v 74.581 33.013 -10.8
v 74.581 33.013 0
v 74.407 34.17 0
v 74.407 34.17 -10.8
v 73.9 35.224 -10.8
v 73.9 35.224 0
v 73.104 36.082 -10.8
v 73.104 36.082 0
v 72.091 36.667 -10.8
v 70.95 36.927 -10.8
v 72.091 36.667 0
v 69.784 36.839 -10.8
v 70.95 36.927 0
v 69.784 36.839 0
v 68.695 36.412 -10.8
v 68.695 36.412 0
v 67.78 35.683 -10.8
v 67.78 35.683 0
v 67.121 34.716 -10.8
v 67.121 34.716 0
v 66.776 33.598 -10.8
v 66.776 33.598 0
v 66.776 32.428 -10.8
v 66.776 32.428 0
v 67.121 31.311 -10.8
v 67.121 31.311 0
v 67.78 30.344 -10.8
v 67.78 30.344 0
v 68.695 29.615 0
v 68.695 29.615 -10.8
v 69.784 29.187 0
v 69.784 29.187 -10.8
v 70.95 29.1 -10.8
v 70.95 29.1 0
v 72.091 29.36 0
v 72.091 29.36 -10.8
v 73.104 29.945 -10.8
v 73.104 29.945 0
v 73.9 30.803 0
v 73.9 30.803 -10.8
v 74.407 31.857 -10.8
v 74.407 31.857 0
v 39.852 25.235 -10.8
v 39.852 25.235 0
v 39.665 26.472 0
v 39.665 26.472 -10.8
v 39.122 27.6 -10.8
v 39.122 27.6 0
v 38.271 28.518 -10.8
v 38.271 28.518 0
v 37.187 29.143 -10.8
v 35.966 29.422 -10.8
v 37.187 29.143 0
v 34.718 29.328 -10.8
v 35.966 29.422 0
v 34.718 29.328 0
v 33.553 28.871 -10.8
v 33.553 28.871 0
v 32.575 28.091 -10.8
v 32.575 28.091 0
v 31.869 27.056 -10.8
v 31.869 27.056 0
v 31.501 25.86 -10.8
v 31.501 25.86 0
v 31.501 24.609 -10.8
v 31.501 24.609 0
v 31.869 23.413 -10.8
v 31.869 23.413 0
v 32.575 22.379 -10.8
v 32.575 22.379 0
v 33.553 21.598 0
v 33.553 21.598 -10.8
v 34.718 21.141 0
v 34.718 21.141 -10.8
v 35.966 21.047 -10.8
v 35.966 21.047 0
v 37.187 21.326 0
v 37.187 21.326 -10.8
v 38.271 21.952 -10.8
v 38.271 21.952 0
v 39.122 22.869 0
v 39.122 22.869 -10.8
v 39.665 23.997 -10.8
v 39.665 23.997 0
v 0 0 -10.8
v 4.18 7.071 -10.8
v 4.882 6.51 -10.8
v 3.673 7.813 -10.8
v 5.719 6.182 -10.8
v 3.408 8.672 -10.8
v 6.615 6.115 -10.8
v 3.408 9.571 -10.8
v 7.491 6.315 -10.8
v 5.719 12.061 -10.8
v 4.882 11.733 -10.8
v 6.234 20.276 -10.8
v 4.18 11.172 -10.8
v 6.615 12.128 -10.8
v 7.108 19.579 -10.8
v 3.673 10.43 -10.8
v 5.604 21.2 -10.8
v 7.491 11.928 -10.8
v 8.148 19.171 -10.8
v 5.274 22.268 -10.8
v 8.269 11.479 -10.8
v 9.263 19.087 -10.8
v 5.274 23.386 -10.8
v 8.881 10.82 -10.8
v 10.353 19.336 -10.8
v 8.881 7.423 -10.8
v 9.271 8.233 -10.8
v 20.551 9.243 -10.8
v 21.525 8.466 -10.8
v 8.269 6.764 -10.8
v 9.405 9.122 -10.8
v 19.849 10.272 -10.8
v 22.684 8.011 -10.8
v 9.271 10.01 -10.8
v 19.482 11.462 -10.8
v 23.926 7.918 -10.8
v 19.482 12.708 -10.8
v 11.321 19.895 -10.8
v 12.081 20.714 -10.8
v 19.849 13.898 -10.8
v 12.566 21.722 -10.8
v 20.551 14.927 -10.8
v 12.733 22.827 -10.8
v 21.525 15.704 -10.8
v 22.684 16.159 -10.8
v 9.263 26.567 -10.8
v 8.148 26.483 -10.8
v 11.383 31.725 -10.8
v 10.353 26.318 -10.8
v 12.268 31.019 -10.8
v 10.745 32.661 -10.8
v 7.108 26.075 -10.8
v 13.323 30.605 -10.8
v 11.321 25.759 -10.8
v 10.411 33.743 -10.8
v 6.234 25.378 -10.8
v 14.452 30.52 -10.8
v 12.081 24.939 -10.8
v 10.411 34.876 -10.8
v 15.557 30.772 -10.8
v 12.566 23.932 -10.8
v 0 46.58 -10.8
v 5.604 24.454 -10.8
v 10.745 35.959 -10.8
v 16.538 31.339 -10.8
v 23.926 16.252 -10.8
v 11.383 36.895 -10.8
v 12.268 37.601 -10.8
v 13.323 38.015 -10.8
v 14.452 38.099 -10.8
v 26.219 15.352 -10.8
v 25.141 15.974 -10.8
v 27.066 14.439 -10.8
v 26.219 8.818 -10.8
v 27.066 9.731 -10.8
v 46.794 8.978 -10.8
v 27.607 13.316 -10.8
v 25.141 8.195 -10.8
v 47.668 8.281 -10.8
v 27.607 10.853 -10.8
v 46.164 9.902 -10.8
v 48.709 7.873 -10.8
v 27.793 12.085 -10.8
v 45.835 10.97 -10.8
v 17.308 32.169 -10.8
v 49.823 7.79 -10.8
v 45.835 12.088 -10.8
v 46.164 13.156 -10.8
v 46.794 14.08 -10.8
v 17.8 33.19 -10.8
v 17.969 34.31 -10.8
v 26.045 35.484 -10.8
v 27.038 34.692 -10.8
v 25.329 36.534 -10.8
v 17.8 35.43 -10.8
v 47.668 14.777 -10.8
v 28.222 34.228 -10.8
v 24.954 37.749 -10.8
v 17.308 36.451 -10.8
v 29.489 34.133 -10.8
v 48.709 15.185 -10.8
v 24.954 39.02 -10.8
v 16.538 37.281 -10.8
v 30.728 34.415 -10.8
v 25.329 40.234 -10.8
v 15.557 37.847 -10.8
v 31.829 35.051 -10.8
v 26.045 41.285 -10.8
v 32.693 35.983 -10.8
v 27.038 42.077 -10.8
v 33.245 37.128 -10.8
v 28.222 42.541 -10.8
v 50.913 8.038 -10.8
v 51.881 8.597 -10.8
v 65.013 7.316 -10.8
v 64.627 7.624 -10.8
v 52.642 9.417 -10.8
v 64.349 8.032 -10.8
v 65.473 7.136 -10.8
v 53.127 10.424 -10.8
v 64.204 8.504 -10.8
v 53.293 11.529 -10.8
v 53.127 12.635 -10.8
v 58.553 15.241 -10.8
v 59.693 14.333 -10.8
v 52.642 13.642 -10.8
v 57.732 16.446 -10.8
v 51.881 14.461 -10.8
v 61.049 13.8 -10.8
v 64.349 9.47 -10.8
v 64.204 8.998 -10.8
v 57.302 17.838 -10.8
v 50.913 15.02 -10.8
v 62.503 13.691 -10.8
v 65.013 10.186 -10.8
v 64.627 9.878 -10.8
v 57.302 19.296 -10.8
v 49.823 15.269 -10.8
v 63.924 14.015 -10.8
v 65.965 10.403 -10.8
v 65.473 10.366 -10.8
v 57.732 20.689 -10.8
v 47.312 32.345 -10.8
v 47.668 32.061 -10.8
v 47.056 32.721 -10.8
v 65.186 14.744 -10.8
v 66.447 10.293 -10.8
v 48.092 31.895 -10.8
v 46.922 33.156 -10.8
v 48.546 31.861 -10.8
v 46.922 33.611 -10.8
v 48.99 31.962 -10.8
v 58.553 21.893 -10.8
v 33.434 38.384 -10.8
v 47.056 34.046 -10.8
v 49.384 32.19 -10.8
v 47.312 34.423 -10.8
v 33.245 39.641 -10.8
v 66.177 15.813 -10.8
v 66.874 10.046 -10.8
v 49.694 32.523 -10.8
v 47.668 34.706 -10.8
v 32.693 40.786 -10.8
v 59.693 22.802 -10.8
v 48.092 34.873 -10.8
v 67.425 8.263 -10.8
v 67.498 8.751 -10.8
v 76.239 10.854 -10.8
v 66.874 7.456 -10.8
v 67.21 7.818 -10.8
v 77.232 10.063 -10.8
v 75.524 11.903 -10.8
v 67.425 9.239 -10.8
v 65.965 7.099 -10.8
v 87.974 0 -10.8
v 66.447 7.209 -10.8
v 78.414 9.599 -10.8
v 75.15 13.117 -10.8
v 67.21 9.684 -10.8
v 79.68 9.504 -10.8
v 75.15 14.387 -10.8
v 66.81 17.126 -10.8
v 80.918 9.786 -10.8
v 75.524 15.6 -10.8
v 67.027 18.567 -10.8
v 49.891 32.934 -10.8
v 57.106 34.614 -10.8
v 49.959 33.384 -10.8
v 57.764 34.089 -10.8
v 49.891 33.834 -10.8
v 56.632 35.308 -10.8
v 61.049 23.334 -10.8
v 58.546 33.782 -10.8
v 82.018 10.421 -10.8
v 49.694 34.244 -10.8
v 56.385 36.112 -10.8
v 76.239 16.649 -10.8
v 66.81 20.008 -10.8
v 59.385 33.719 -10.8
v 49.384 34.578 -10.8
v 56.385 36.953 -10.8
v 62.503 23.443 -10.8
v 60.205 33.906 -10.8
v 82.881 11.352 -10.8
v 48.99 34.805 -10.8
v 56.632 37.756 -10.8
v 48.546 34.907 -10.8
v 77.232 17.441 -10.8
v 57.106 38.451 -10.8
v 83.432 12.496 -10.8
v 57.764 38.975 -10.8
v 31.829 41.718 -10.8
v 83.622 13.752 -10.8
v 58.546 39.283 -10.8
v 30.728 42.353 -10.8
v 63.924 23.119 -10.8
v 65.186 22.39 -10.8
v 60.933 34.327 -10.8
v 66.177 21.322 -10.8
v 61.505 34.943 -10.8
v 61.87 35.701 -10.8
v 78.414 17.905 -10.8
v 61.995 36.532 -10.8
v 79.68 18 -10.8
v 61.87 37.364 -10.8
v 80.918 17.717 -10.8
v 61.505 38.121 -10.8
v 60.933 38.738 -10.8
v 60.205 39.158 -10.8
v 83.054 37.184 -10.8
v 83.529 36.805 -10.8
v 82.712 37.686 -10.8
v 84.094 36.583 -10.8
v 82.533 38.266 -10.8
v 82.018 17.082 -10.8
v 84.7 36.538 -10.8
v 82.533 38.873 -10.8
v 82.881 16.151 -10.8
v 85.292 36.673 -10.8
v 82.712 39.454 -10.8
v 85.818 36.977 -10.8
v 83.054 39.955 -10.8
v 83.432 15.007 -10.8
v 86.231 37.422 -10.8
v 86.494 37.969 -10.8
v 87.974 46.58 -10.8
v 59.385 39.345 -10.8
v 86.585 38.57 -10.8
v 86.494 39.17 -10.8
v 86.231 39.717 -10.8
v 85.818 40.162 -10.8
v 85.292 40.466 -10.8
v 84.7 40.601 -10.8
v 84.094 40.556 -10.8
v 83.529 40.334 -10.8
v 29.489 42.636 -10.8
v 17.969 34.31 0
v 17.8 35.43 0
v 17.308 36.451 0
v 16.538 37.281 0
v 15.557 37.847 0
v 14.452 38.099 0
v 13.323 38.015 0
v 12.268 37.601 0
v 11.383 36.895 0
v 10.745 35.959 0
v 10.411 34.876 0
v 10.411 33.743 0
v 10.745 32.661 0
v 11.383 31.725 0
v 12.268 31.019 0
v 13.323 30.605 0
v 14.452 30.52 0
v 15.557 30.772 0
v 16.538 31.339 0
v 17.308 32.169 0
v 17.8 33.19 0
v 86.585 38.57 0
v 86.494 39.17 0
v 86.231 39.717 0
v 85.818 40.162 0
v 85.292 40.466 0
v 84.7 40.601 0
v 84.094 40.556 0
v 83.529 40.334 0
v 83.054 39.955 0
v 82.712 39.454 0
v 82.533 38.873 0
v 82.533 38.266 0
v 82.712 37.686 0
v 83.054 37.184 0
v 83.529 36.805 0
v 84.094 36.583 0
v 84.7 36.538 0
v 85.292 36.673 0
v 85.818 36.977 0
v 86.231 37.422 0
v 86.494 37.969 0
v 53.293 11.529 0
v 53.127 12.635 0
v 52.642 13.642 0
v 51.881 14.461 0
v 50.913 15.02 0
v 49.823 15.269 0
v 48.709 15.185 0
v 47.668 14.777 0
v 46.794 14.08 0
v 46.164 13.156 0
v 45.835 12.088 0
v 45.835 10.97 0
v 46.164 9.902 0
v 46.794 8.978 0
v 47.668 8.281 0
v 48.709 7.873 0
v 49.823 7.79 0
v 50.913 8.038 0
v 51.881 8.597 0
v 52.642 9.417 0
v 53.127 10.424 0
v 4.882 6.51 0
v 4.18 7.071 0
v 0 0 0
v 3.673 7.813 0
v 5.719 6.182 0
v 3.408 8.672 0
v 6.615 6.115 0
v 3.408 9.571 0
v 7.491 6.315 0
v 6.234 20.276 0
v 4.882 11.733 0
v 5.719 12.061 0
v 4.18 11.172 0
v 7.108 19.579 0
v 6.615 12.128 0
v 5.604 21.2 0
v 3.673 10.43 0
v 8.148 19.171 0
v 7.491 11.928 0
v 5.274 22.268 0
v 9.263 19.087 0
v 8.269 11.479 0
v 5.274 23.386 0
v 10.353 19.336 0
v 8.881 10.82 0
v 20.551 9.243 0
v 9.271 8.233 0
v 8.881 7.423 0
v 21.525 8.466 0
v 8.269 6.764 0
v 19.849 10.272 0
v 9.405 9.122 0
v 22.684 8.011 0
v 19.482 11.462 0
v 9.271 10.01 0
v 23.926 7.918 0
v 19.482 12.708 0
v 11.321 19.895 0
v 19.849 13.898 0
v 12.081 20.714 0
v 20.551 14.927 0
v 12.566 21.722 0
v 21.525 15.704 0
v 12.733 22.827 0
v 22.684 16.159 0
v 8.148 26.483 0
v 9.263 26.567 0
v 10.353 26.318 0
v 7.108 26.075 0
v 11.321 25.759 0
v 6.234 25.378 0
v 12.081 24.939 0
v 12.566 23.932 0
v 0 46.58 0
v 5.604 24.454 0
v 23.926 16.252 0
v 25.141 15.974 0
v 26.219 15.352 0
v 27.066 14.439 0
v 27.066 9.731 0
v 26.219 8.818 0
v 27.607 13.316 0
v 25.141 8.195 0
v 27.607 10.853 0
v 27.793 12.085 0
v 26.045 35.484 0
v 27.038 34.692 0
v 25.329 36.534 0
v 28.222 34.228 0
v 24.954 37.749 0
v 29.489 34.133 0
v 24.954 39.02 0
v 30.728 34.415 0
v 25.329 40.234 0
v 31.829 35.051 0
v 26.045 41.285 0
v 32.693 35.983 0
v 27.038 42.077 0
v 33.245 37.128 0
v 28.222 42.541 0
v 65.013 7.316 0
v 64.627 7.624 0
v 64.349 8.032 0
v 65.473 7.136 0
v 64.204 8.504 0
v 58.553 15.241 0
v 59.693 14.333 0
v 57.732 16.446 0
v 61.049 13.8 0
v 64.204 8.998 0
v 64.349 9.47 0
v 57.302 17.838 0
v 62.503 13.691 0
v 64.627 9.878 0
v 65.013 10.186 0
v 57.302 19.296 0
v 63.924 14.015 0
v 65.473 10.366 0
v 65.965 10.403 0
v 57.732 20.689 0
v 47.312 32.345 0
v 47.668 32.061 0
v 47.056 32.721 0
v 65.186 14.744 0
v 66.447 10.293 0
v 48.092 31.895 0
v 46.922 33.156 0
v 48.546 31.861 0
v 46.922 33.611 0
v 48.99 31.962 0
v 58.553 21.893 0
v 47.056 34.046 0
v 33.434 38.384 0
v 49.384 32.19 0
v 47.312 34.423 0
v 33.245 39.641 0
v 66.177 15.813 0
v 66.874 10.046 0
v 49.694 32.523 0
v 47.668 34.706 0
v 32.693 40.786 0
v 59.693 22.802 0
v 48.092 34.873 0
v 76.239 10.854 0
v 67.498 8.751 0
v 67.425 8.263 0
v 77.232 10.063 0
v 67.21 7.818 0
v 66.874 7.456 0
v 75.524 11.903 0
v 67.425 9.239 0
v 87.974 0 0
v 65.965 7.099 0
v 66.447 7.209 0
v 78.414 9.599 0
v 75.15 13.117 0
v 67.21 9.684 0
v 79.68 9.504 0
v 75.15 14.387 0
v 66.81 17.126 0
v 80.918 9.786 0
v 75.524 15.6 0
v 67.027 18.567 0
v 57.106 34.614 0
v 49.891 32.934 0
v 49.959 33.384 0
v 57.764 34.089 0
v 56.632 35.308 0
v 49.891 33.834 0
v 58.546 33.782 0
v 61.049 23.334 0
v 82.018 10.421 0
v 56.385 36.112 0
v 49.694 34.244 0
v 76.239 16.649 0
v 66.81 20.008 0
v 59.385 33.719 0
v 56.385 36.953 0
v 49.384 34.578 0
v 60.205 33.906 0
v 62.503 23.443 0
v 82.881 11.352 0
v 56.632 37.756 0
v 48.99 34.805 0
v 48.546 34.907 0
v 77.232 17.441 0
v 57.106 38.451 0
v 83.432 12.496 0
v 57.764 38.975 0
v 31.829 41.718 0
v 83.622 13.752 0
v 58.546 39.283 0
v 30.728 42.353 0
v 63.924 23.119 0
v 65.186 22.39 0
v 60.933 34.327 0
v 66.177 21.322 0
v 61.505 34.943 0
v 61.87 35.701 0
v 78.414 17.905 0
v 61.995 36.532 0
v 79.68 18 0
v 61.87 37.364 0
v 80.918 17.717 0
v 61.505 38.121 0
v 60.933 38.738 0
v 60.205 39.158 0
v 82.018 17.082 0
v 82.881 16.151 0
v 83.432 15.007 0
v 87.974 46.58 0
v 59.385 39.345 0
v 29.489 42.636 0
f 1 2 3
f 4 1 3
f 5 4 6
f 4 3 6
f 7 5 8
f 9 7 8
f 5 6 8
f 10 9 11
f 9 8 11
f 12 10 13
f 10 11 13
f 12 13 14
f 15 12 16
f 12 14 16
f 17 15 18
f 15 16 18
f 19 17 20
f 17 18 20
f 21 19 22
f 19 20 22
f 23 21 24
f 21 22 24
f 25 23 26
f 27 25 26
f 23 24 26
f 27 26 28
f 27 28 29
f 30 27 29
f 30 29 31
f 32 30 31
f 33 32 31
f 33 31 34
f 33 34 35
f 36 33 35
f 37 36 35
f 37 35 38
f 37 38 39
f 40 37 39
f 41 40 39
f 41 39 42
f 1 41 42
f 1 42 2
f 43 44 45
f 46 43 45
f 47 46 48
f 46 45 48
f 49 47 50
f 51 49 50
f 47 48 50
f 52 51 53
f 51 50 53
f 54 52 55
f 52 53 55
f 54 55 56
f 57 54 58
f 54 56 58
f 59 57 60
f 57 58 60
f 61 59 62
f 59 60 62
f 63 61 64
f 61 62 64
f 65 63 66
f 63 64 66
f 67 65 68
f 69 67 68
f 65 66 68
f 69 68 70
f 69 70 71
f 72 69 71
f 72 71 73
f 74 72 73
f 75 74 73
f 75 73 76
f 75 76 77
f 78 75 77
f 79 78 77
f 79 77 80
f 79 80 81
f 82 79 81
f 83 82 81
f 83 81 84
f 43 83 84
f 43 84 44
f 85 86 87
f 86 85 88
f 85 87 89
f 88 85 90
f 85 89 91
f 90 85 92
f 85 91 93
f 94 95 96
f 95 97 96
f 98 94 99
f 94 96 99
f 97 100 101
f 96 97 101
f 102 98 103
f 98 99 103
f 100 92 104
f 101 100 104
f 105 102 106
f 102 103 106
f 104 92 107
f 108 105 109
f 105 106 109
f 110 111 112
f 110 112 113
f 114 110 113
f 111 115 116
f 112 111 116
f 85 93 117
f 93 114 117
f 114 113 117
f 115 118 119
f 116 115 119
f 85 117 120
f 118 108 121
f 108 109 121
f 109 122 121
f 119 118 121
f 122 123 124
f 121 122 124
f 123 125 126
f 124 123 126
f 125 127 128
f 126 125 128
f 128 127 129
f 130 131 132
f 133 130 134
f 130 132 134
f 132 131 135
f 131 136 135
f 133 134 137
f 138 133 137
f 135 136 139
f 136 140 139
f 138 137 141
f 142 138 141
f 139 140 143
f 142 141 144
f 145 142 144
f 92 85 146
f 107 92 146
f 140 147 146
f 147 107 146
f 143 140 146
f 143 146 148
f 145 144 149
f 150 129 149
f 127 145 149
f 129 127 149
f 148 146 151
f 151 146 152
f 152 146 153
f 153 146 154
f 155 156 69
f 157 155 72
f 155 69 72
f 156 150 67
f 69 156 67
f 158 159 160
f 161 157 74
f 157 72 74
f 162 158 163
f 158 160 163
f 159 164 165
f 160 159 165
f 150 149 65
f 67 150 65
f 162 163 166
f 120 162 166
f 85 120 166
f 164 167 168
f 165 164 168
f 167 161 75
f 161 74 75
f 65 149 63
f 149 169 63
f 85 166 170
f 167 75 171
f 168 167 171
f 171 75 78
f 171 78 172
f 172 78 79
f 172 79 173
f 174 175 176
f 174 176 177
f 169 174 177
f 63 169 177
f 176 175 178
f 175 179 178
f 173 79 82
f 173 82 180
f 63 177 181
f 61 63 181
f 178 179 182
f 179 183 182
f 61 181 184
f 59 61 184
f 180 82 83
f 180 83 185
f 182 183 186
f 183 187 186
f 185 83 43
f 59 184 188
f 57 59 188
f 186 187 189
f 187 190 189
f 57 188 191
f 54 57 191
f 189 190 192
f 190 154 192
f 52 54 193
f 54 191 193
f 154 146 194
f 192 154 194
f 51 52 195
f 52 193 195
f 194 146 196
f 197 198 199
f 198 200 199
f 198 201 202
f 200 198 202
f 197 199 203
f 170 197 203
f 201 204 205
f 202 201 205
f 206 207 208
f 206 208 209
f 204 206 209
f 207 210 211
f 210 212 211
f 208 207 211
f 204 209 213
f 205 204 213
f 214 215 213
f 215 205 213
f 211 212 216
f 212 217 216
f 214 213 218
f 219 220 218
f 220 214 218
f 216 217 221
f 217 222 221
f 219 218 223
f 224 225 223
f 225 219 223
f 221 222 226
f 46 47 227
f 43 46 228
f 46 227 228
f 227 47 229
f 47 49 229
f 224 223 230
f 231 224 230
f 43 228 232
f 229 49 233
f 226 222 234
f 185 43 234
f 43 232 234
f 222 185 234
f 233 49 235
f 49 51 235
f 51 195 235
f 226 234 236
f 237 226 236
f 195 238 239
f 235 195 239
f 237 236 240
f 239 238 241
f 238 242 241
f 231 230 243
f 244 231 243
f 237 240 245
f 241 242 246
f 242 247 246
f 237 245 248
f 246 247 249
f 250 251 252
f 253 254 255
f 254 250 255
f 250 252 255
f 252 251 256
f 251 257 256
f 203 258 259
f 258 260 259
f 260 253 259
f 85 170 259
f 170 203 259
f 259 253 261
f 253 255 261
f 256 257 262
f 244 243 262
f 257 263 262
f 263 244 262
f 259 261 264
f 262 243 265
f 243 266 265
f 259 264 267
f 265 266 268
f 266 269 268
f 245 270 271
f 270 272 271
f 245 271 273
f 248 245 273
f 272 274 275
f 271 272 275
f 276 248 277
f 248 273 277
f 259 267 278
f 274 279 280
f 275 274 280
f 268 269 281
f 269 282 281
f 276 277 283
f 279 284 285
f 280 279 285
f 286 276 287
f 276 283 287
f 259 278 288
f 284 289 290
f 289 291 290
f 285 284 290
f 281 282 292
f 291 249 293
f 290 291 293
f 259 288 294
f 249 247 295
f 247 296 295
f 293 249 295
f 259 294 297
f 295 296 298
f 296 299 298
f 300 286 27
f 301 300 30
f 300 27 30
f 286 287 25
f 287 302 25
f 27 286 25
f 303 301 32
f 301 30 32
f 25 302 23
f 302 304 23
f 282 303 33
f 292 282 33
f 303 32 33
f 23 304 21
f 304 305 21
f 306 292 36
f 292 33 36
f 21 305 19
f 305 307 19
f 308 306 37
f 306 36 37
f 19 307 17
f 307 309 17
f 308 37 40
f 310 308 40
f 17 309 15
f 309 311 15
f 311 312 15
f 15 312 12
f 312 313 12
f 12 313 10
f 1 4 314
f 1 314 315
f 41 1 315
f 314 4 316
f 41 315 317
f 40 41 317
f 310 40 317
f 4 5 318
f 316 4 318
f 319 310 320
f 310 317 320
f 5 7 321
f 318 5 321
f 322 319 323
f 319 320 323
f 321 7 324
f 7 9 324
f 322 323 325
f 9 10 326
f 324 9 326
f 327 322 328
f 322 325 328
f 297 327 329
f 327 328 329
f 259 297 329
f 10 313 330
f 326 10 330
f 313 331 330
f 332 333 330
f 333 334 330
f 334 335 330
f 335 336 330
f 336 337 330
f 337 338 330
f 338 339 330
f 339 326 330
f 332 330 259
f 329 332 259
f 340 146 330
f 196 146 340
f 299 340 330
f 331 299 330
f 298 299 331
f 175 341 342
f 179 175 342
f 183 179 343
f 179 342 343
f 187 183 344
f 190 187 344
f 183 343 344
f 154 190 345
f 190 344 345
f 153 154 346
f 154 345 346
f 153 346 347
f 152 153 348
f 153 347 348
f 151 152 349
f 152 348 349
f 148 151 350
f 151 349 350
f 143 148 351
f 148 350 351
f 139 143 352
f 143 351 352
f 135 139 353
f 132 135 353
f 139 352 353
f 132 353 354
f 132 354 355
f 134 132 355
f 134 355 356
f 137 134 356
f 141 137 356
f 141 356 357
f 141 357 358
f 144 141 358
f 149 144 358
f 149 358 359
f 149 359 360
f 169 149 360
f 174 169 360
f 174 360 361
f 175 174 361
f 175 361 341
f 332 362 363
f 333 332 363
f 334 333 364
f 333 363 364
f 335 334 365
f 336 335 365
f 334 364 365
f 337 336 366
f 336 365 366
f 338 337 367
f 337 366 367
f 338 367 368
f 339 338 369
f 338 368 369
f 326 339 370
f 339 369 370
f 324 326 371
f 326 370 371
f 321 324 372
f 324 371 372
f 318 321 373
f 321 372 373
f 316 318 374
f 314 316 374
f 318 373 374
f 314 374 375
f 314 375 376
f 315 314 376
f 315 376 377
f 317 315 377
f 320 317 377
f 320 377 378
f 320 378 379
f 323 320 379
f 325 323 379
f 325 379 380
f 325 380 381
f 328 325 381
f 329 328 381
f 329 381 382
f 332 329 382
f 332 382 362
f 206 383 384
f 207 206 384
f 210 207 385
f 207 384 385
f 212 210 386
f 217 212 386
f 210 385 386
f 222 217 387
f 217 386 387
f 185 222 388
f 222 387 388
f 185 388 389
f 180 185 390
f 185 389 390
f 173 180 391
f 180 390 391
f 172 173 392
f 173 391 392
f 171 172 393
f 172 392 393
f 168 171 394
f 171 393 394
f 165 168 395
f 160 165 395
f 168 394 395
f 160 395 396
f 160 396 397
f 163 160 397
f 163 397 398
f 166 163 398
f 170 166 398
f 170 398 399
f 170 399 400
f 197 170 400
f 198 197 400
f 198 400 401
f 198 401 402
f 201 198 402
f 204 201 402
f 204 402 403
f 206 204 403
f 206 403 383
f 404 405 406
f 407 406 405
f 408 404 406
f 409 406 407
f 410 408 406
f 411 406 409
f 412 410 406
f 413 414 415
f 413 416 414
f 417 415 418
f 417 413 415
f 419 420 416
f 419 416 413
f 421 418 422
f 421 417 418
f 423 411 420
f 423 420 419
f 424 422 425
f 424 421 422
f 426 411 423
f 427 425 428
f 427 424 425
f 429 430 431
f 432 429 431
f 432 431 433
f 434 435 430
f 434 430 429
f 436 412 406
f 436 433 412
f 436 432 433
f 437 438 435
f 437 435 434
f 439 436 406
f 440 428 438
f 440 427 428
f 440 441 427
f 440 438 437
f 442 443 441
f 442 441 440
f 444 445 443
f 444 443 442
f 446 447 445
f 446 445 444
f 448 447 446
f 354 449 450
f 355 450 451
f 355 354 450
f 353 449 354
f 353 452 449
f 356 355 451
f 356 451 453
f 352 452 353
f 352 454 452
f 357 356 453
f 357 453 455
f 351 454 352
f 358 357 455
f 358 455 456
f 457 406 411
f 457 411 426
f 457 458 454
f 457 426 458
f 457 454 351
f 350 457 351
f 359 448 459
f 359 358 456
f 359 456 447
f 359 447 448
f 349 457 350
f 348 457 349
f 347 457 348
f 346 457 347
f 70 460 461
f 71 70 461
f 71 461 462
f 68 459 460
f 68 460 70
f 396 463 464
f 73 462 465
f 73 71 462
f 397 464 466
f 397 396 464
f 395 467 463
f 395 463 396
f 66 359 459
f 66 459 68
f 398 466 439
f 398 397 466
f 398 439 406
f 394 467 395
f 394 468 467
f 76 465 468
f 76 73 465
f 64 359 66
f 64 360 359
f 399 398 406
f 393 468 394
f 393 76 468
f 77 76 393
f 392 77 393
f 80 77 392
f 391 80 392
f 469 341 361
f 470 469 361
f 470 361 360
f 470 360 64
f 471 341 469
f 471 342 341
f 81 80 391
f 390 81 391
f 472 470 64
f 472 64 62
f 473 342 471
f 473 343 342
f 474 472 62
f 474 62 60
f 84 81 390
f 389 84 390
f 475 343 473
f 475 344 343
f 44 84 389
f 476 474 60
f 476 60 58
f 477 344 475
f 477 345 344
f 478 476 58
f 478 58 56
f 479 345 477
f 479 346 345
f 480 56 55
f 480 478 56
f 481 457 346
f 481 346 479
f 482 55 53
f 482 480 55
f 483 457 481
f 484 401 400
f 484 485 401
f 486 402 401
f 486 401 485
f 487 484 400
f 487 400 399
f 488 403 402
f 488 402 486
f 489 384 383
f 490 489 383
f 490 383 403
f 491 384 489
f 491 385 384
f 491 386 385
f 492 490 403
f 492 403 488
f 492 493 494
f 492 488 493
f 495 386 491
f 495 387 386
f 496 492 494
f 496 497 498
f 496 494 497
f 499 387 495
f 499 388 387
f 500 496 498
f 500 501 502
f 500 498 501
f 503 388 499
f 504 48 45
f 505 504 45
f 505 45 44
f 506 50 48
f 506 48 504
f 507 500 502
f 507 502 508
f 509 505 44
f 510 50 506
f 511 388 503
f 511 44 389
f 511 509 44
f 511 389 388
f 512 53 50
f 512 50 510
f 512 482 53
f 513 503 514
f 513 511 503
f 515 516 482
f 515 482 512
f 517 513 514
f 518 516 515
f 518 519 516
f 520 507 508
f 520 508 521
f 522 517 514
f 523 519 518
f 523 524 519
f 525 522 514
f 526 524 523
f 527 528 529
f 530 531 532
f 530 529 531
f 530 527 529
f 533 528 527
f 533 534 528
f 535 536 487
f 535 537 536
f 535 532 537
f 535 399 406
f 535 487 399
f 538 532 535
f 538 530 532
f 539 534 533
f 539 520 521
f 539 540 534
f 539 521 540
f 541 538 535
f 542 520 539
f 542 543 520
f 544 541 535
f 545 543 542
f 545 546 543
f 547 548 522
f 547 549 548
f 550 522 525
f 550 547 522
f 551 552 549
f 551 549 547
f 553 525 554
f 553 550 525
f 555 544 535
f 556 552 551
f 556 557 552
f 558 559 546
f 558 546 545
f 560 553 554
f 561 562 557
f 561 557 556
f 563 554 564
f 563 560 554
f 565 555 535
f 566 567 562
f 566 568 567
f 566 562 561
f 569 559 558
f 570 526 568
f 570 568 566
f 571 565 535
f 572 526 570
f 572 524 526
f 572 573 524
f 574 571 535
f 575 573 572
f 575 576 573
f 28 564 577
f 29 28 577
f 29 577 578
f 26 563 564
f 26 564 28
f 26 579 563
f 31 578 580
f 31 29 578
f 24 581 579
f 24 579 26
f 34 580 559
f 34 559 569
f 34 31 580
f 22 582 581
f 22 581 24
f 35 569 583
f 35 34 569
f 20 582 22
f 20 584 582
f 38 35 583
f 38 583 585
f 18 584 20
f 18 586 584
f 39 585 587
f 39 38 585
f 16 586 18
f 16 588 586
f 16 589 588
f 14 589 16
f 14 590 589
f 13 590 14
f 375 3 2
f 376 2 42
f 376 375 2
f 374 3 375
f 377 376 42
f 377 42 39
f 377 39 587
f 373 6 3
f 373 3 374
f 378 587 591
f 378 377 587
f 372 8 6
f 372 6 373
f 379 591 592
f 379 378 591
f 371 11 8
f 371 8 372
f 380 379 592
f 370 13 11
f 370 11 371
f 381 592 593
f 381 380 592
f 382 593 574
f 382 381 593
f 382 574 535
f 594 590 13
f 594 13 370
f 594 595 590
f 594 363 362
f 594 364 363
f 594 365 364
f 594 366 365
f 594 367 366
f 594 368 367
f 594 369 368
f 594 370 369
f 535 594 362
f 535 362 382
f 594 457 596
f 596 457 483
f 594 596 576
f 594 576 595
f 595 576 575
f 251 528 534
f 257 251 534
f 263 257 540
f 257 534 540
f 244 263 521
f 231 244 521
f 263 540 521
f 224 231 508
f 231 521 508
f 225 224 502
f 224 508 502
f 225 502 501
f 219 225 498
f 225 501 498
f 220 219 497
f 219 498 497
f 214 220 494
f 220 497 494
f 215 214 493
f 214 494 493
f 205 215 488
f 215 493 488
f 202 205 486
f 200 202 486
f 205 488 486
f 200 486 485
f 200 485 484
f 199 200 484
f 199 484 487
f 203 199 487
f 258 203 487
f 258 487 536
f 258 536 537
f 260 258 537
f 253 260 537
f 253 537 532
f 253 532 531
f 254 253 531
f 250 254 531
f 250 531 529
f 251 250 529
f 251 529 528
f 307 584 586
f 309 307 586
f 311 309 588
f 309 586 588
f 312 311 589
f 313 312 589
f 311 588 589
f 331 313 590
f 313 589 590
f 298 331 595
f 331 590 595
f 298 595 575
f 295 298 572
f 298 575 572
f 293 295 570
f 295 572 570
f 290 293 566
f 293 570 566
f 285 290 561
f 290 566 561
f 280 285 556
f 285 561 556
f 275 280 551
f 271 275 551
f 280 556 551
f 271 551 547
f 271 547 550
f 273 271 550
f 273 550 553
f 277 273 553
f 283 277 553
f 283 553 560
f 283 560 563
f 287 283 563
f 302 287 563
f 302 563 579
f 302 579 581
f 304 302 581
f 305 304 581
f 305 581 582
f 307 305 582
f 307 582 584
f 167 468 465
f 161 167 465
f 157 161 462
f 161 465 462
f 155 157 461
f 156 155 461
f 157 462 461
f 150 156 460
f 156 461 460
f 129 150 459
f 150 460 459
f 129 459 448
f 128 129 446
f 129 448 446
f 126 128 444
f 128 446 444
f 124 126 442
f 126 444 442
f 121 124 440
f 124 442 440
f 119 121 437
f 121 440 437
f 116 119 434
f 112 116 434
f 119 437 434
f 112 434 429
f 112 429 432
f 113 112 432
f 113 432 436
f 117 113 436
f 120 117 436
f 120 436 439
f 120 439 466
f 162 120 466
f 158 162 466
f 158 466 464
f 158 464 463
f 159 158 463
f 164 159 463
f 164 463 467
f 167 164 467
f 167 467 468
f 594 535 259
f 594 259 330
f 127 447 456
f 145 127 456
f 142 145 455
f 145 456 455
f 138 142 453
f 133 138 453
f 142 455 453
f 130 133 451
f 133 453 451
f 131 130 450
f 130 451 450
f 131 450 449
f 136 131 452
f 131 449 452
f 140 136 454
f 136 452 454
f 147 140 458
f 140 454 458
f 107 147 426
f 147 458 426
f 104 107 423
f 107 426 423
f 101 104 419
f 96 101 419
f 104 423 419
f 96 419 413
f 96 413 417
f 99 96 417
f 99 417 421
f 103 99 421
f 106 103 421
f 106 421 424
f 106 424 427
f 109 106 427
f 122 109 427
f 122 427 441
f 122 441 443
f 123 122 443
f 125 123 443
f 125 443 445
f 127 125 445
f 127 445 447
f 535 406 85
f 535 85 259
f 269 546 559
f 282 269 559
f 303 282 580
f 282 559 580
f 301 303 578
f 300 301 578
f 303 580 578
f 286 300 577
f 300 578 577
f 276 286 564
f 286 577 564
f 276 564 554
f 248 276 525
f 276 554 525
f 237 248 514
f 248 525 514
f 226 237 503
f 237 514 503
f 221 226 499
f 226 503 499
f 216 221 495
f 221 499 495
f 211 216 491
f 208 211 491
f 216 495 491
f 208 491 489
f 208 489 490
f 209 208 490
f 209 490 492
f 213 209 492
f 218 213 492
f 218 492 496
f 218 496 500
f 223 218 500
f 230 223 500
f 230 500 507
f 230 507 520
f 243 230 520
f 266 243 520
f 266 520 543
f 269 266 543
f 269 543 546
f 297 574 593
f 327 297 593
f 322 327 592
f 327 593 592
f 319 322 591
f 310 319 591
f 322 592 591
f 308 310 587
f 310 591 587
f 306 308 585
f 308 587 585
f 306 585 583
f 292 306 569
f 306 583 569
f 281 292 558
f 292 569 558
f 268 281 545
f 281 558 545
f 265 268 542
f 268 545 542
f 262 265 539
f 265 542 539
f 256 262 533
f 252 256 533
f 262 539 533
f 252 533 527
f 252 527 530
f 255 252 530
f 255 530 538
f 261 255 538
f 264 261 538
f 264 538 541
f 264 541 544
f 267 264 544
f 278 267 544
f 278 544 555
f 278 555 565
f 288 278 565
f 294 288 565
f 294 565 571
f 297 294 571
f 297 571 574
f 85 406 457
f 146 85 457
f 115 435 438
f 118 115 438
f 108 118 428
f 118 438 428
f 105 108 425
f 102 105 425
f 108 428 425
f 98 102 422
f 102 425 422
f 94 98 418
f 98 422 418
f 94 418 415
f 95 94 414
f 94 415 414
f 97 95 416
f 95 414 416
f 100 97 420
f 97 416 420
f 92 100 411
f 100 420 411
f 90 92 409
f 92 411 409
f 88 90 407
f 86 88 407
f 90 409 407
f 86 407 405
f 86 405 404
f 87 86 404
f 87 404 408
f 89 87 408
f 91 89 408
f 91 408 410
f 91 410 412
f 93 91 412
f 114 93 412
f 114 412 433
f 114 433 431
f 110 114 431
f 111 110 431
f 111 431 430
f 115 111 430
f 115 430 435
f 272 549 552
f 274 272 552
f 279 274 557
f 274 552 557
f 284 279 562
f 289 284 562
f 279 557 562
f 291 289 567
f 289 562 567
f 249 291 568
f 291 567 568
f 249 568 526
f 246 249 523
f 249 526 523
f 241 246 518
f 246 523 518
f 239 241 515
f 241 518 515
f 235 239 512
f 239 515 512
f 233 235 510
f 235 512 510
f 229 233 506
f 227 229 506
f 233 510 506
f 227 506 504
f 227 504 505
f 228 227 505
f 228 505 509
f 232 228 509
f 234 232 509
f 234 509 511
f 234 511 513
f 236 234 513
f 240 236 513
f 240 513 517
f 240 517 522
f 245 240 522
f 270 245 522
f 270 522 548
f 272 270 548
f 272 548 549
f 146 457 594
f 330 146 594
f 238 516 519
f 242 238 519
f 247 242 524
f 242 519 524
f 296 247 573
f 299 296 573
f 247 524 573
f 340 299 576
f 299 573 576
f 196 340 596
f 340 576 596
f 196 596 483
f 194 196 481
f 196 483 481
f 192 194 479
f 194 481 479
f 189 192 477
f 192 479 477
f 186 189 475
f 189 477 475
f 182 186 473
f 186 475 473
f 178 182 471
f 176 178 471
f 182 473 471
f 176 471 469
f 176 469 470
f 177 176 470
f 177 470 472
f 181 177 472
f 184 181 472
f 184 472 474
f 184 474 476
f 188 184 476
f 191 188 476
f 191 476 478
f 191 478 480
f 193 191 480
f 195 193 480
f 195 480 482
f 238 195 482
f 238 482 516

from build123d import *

# Parameters (mm, degrees)
F0_W     = 87.97396
F0_H     = 46.579894
F1_DEPTH = 10.8
F2_R     = 4.263815
F2_R_2   = 4.198962
F2_R_3   = 3.750182
F2_R_4   = 3.800158
F2_R_5   = 4.17849
F2_R_6   = 3.014974
F2_R_7   = 4.88964
F2_R_8   = 3.924494
F2_R_9   = 2.037287
F2_R_10  = 2.82101
F2_R_11  = 1.527268
F2_R_12  = 1.656553
F2_R_13  = 4.259792
F3_DEPTH = 25


with BuildPart() as f1:
    # F0 (on Top) → F1 (new body)
    with BuildSketch(Plane.XY):
        with Locations((43.98698, 23.289947)):
            Rectangle(F0_W, F0_H)
    extrude(amount=-F1_DEPTH)

    # F2 (on face) → F3 (cut)
    with BuildSketch(Plane.XY):
        with Locations((29.170312, 38.384426)):
            Circle(F2_R)
        with Locations((35.652604, 25.234634)):
            Circle(F2_R_2)
        with Locations((8.982603, 22.826925)):
            Circle(F2_R_3)
        with Locations((14.168437, 34.309842)):
            Circle(F2_R_4)
        with Locations((23.614062, 12.084842)):
            Circle(F2_R_5)
        with Locations((6.389686, 9.121509)):
            Circle(F2_R_6)
        with Locations((49.543228, 11.529217)):
            Circle(F2_R_3)
        with Locations((62.137399, 18.567134)):
            Circle(F2_R_7)
        with Locations((70.656978, 33.013385)):
            Circle(F2_R_8)
        with Locations((84.547602, 38.569633)):
            Circle(F2_R_9)
        with Locations((59.174061, 36.532342)):
            Circle(F2_R_10)
        with Locations((48.431981, 33.383802)):
            Circle(F2_R_11)
        with Locations((65.841563, 8.751092)):
            Circle(F2_R_12)
        with Locations((79.361774, 13.751717)):
            Circle(F2_R_13)
    extrude(amount=-F3_DEPTH, mode=Mode.SUBTRACT)


solid = f1.part
